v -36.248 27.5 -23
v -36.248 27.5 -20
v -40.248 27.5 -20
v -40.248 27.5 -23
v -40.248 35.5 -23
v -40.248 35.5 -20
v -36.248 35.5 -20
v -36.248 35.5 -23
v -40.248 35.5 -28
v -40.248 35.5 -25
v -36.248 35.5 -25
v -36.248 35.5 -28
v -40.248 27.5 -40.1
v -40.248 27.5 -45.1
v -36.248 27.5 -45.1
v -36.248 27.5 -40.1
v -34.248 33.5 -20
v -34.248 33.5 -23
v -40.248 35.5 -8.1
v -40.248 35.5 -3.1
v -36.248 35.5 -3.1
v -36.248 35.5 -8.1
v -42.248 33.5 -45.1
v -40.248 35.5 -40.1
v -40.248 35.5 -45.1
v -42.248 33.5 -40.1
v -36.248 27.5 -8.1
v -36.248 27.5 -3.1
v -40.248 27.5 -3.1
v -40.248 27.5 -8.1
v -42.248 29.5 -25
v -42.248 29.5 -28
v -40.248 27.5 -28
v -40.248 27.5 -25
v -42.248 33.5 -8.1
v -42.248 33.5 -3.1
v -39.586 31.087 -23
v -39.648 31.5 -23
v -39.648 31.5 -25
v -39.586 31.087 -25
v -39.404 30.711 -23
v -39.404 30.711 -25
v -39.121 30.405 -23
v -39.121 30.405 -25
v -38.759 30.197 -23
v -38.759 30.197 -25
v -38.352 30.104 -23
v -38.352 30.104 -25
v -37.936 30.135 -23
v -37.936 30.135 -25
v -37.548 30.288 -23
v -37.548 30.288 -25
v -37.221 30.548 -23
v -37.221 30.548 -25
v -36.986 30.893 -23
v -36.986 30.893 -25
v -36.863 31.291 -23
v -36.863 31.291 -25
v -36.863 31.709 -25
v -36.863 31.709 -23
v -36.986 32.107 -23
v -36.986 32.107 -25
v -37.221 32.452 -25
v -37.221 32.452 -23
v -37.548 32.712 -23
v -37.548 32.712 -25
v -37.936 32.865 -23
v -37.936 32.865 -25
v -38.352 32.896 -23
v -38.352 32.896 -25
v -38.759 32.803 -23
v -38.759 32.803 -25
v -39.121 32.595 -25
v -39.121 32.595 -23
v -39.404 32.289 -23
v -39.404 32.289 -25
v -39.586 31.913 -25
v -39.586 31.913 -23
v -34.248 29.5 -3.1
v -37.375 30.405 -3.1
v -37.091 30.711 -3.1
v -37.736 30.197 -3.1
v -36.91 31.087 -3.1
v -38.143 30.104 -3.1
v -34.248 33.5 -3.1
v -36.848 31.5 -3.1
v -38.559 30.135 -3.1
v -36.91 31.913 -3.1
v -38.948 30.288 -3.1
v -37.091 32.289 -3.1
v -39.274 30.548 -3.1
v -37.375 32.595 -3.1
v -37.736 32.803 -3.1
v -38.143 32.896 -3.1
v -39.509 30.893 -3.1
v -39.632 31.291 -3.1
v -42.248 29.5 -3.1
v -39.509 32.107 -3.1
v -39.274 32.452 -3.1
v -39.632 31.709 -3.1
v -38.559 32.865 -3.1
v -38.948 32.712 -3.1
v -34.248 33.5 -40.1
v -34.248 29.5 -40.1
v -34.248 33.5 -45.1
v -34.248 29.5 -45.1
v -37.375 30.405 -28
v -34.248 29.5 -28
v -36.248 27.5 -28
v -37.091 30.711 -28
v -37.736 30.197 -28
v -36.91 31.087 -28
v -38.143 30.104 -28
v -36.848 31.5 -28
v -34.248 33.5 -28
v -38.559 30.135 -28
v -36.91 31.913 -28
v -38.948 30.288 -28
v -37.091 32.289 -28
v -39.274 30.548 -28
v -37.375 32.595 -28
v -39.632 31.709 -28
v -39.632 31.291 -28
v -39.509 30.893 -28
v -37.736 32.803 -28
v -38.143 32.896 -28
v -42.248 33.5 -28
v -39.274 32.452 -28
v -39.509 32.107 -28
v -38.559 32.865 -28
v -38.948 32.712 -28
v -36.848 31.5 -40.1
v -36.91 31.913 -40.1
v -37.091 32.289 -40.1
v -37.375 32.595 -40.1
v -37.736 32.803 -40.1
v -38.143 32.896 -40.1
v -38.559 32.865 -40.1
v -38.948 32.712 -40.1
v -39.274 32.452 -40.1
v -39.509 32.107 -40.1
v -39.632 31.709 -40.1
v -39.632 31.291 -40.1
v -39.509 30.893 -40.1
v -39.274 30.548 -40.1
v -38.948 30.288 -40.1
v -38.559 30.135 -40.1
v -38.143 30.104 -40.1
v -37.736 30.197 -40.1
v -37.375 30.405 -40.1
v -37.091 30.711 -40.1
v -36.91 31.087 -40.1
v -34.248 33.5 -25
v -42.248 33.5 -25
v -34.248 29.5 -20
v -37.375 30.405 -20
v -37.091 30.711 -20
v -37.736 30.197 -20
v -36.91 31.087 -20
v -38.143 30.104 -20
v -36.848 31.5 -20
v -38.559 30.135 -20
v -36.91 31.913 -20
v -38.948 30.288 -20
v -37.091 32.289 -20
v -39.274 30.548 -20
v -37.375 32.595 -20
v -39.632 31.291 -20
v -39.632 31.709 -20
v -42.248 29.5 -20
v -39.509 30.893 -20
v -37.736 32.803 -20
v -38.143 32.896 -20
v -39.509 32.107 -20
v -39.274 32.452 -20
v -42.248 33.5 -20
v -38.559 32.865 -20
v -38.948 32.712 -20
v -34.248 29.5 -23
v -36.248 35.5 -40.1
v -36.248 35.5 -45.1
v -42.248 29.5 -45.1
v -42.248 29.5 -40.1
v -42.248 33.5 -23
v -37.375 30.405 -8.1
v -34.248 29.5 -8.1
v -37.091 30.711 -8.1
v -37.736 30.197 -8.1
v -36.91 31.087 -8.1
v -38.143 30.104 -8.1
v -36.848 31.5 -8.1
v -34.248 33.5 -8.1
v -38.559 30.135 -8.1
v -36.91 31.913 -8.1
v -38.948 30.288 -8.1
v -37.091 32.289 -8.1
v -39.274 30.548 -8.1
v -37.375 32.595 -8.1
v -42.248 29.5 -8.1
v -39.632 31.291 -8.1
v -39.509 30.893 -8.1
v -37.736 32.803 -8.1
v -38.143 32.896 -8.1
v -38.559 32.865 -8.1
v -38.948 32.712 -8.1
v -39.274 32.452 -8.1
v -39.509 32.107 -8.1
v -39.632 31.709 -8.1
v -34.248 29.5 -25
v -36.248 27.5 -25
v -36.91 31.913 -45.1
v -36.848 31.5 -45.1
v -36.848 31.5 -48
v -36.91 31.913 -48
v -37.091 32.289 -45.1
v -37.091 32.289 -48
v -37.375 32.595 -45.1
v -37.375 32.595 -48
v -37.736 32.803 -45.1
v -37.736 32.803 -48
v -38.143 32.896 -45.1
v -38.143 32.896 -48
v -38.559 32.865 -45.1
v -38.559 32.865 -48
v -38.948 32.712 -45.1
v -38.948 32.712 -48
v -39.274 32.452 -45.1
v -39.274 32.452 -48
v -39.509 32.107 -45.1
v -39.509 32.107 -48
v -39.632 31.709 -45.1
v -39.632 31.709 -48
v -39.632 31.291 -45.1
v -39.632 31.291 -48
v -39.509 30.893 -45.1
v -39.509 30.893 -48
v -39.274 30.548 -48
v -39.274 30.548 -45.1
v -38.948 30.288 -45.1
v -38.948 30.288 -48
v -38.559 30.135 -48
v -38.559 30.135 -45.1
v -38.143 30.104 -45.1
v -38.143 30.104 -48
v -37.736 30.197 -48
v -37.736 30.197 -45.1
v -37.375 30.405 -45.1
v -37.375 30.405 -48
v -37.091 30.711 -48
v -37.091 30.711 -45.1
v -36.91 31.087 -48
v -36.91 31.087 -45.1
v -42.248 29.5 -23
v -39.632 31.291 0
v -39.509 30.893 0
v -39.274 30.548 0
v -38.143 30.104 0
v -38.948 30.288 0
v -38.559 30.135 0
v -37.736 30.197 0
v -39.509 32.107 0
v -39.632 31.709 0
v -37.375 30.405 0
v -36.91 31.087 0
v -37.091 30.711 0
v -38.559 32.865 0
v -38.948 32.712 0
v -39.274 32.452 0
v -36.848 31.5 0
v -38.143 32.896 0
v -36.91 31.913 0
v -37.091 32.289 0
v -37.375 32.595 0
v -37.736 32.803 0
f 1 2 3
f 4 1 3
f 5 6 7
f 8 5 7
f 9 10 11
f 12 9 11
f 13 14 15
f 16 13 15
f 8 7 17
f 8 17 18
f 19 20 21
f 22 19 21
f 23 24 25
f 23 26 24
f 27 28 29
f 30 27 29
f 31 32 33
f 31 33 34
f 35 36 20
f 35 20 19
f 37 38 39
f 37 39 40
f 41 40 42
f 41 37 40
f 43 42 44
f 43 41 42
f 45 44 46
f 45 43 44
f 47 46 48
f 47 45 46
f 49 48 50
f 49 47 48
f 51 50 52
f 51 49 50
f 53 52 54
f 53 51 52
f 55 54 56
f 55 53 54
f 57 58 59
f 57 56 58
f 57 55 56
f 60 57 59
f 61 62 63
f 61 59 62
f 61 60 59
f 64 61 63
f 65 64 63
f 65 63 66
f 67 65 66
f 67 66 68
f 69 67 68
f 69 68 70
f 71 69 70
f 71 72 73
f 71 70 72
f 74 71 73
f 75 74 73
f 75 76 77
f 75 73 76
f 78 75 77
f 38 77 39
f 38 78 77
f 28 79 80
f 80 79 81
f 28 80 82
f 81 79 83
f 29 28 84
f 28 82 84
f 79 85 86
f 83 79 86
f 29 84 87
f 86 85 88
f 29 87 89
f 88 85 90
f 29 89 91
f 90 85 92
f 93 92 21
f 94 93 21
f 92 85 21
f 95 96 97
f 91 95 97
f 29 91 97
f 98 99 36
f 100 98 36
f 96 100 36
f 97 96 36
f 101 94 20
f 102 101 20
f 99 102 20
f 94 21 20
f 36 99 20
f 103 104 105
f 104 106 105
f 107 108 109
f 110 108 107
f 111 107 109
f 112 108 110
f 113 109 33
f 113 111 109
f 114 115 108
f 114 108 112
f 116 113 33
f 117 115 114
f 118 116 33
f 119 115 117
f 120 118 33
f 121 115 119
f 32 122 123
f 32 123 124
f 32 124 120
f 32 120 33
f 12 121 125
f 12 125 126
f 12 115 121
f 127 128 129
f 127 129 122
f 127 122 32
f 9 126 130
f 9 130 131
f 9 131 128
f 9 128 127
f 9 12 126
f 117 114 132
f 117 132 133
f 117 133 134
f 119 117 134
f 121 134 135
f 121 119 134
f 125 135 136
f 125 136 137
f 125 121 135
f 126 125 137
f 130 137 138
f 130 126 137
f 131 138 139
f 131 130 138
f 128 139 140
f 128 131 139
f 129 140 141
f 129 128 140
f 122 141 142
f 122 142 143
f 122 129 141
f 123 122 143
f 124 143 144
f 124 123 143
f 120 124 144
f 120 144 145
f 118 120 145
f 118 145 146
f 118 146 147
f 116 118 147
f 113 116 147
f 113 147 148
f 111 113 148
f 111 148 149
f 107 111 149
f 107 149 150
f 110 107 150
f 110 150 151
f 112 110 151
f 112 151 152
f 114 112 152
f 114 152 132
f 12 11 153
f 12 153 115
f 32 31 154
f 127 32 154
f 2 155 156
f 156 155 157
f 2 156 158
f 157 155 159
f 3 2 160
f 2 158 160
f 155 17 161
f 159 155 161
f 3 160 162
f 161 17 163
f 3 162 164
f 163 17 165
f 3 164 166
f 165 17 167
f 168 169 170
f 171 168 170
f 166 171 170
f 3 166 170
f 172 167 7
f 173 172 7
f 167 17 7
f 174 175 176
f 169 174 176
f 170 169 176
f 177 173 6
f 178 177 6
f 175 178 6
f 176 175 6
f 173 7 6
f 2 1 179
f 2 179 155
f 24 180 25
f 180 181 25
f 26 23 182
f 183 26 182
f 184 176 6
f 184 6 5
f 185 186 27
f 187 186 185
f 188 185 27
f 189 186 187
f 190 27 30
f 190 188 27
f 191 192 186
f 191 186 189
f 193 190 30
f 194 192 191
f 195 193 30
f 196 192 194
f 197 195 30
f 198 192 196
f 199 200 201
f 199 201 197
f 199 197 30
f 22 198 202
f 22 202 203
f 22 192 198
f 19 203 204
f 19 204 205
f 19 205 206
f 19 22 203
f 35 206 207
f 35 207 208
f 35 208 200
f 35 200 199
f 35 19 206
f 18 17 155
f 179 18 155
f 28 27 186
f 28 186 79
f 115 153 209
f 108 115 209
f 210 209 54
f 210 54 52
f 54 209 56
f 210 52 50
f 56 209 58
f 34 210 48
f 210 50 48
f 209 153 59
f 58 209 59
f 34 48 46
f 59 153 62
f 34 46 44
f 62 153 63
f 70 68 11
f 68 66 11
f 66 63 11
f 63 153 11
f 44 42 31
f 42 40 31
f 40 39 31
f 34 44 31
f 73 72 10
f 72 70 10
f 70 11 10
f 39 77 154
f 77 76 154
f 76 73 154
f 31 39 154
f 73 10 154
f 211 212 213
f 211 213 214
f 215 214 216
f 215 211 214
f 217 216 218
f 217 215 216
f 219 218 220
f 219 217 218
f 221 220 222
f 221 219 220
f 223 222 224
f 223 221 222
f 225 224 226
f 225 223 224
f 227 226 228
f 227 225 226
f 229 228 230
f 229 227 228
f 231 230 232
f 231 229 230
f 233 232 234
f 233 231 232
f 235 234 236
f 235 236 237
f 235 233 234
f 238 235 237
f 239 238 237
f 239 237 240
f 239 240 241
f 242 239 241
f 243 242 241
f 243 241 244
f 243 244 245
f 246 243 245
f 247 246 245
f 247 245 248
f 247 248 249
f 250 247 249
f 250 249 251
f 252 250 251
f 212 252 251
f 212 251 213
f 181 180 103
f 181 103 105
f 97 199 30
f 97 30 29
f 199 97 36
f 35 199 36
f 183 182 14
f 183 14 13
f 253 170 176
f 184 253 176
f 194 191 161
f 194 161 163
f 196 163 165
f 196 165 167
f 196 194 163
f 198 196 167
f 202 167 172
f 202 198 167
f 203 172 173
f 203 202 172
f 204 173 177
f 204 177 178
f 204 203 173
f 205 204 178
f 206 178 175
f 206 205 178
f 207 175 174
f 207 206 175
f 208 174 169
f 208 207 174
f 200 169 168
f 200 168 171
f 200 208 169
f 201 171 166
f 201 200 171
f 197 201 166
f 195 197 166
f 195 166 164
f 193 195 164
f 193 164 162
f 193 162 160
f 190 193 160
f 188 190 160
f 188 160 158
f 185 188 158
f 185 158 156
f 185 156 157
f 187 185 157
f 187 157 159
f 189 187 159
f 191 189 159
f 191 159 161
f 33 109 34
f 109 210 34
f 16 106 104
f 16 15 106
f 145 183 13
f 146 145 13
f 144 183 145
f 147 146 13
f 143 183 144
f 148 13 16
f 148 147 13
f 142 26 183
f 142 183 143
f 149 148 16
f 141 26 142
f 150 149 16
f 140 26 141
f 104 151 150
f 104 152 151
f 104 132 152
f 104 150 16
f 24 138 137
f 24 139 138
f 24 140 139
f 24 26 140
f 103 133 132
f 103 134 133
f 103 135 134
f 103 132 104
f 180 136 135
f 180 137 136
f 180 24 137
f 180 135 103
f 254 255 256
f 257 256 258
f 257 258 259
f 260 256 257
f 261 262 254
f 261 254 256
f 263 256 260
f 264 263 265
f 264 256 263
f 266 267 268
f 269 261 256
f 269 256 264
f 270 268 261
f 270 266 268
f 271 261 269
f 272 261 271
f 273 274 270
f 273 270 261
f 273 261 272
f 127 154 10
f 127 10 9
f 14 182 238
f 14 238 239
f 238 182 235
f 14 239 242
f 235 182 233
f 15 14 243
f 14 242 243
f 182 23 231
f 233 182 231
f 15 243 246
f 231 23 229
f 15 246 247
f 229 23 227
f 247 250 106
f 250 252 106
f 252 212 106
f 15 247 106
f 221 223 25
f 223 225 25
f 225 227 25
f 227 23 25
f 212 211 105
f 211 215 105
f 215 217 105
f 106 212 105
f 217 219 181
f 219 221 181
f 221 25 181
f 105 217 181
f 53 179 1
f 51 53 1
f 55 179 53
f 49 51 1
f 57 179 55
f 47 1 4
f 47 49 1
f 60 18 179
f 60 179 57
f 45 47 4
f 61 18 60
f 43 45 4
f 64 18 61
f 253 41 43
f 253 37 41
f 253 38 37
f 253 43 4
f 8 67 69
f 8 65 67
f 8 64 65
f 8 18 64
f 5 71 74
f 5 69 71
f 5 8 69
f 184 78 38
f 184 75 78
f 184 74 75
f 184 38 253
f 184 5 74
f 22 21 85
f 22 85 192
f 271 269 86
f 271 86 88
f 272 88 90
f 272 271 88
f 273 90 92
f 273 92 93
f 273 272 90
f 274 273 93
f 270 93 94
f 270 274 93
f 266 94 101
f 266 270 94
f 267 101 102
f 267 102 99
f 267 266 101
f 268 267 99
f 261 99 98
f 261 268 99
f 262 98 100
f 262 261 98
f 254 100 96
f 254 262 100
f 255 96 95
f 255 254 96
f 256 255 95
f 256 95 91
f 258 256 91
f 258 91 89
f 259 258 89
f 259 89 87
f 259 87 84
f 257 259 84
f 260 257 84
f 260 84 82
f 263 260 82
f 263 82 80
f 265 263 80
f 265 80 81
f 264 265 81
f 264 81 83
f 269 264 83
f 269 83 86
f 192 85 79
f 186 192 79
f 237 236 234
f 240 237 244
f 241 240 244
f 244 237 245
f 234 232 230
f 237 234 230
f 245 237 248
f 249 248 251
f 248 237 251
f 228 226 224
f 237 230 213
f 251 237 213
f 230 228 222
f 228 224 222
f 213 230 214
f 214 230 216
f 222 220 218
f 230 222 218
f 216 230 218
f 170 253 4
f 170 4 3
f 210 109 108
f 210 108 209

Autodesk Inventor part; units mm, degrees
ref_plane "Plano de trabajo1" through (0, 0, 0) normal (0, 0, 1) x (1, 0, 0)
sketch "Boceto1" plane through (0, 0, 0) normal (0, 0, 1) x (1, 0, 0)
  circle A0 centre (-38.2477, 31.5) radius 1.5 construction
  circle A1 centre (-38.2477, 31.5) radius 1.4
  point P0 (0, 0)
  dimension "d2" = 0.1
ref_plane "Plano de trabajo2" through (-44.5, -51.5, -48) normal (0, 0, -1) x (0, 1, 0)
extrude "Extrusión1" add sketch "Boceto1" against normal up to surface (48 mm away)
ref_plane "Plano de trabajo3" through (0, 0, -45.1) normal (0, 0, 1) x (1, 0, 0)
sketch "Boceto2" plane through (0, 0, -45.1) normal (0, 0, 1) x (1, 0, 0)
  circle A0 centre (-38.2477, 31.5) radius 1.4 construction
  line L0 (-34.2477, 35.5) -> (-42.2477, 35.5)
  line L1 (-42.2477, 35.5) -> (-42.2477, 27.5)
  line L2 (-42.2477, 27.5) -> (-34.2477, 27.5)
  line L3 (-34.2477, 27.5) -> (-34.2477, 35.5)
  line L4 (-34.2477, 35.5) -> (-42.2477, 27.5) construction
  line L5 (-42.2477, 35.5) -> (-34.2477, 27.5) construction
  point P0 (0, 0)
  dimension "d3" = 8
  dimension "d4" = 8
extrude "Extrusión2" add sketch "Boceto2" along normal blind 5
chamfer "Chaflán1" distance 2 angle 45 4 edges at (-42.2477, 35.5, -42.6) (-34.2477, 35.5, -42.6) (-34.2477, 27.5, -42.6) (-42.2477, 27.5, -42.6)
ref_plane "Plano de trabajo4" through (0, 0, -3.1) normal (0, 0, -1) x (-1, 0, 0)
sketch "Boceto3" plane through (0, 0, -3.1) normal (0, 0, -1) x (-1, 0, 0)
  circle A0 centre (38.2477, 31.5) radius 1.4 construction
  line L0 (34.2477, 27.5) -> (42.2477, 27.5)
  line L1 (42.2477, 27.5) -> (42.2477, 35.5)
  line L2 (42.2477, 35.5) -> (34.2477, 35.5)
  line L3 (34.2477, 35.5) -> (34.2477, 27.5)
  line L4 (34.2477, 27.5) -> (42.2477, 35.5) construction
  line L5 (42.2477, 27.5) -> (34.2477, 35.5) construction
  point P0 (0, 0)
  dimension "d10" = 8
  dimension "d11" = 8
extrude "Extrusión3" add sketch "Boceto3" along normal blind 5
chamfer "Chaflán2" distance 2 angle 45 4 edges at (-42.2477, 35.5, -5.6) (-34.2477, 35.5, -5.6) (-34.2477, 27.5, -5.6) (-42.2477, 27.5, -5.6)
ref_plane "Plano de trabajo5" through (-38.2477, 31.5, -24) normal (0, 0, -1) x (-1, 0, 0)
sketch "Boceto4" plane through (-38.2477, 31.5, -24) normal (0, 0, -1) x (-1, 0, 0)
  circle A0 centre (0, 0) radius 1.5 construction
  line L0 (-4, -4) -> (4, -4)
  line L1 (4, -4) -> (4, 4)
  line L2 (4, 4) -> (-4, 4)
  line L3 (-4, 4) -> (-4, -4)
  line L4 (-4, -4) -> (4, 4) construction
  line L5 (4, -4) -> (-4, 4) construction
  point P0 (-38.2477, -31.5)
  dimension "d17" = 8
  dimension "d18" = 8
extrude "Extrusión4" add sketch "Boceto4" along normal mid plane 8
chamfer "Chaflán3" distance 2 angle 45 4 edges at (-42.2477, 35.5, -24) (-42.2477, 27.5, -24) (-34.2477, 35.5, -24) (-34.2477, 27.5, -24)
sketch "Boceto5" plane through (-38.2477, 31.5, -24) normal (0, 0, -1) x (-1, 0, 0)
  circle A0 centre (0, 0) radius 1.4 construction
  line L0 (-4, 4) -> (4, 4)
  line L1 (4, 4) -> (4, -4)
  line L2 (4, -4) -> (-4, -4)
  line L3 (-4, -4) -> (-4, 4)
  line L4 (-4, 4) -> (4, -4) construction
  line L5 (4, 4) -> (-4, -4) construction
  circle A1 centre (0, 0) radius 1.4
  point P0 (-38.2477, -31.5)
  dimension "d24" = 8
  dimension "d25" = 8
extrude "Extrusión5" cut sketch "Boceto5" along normal mid plane 2
properties part number "EjeFrontalGrúa"
